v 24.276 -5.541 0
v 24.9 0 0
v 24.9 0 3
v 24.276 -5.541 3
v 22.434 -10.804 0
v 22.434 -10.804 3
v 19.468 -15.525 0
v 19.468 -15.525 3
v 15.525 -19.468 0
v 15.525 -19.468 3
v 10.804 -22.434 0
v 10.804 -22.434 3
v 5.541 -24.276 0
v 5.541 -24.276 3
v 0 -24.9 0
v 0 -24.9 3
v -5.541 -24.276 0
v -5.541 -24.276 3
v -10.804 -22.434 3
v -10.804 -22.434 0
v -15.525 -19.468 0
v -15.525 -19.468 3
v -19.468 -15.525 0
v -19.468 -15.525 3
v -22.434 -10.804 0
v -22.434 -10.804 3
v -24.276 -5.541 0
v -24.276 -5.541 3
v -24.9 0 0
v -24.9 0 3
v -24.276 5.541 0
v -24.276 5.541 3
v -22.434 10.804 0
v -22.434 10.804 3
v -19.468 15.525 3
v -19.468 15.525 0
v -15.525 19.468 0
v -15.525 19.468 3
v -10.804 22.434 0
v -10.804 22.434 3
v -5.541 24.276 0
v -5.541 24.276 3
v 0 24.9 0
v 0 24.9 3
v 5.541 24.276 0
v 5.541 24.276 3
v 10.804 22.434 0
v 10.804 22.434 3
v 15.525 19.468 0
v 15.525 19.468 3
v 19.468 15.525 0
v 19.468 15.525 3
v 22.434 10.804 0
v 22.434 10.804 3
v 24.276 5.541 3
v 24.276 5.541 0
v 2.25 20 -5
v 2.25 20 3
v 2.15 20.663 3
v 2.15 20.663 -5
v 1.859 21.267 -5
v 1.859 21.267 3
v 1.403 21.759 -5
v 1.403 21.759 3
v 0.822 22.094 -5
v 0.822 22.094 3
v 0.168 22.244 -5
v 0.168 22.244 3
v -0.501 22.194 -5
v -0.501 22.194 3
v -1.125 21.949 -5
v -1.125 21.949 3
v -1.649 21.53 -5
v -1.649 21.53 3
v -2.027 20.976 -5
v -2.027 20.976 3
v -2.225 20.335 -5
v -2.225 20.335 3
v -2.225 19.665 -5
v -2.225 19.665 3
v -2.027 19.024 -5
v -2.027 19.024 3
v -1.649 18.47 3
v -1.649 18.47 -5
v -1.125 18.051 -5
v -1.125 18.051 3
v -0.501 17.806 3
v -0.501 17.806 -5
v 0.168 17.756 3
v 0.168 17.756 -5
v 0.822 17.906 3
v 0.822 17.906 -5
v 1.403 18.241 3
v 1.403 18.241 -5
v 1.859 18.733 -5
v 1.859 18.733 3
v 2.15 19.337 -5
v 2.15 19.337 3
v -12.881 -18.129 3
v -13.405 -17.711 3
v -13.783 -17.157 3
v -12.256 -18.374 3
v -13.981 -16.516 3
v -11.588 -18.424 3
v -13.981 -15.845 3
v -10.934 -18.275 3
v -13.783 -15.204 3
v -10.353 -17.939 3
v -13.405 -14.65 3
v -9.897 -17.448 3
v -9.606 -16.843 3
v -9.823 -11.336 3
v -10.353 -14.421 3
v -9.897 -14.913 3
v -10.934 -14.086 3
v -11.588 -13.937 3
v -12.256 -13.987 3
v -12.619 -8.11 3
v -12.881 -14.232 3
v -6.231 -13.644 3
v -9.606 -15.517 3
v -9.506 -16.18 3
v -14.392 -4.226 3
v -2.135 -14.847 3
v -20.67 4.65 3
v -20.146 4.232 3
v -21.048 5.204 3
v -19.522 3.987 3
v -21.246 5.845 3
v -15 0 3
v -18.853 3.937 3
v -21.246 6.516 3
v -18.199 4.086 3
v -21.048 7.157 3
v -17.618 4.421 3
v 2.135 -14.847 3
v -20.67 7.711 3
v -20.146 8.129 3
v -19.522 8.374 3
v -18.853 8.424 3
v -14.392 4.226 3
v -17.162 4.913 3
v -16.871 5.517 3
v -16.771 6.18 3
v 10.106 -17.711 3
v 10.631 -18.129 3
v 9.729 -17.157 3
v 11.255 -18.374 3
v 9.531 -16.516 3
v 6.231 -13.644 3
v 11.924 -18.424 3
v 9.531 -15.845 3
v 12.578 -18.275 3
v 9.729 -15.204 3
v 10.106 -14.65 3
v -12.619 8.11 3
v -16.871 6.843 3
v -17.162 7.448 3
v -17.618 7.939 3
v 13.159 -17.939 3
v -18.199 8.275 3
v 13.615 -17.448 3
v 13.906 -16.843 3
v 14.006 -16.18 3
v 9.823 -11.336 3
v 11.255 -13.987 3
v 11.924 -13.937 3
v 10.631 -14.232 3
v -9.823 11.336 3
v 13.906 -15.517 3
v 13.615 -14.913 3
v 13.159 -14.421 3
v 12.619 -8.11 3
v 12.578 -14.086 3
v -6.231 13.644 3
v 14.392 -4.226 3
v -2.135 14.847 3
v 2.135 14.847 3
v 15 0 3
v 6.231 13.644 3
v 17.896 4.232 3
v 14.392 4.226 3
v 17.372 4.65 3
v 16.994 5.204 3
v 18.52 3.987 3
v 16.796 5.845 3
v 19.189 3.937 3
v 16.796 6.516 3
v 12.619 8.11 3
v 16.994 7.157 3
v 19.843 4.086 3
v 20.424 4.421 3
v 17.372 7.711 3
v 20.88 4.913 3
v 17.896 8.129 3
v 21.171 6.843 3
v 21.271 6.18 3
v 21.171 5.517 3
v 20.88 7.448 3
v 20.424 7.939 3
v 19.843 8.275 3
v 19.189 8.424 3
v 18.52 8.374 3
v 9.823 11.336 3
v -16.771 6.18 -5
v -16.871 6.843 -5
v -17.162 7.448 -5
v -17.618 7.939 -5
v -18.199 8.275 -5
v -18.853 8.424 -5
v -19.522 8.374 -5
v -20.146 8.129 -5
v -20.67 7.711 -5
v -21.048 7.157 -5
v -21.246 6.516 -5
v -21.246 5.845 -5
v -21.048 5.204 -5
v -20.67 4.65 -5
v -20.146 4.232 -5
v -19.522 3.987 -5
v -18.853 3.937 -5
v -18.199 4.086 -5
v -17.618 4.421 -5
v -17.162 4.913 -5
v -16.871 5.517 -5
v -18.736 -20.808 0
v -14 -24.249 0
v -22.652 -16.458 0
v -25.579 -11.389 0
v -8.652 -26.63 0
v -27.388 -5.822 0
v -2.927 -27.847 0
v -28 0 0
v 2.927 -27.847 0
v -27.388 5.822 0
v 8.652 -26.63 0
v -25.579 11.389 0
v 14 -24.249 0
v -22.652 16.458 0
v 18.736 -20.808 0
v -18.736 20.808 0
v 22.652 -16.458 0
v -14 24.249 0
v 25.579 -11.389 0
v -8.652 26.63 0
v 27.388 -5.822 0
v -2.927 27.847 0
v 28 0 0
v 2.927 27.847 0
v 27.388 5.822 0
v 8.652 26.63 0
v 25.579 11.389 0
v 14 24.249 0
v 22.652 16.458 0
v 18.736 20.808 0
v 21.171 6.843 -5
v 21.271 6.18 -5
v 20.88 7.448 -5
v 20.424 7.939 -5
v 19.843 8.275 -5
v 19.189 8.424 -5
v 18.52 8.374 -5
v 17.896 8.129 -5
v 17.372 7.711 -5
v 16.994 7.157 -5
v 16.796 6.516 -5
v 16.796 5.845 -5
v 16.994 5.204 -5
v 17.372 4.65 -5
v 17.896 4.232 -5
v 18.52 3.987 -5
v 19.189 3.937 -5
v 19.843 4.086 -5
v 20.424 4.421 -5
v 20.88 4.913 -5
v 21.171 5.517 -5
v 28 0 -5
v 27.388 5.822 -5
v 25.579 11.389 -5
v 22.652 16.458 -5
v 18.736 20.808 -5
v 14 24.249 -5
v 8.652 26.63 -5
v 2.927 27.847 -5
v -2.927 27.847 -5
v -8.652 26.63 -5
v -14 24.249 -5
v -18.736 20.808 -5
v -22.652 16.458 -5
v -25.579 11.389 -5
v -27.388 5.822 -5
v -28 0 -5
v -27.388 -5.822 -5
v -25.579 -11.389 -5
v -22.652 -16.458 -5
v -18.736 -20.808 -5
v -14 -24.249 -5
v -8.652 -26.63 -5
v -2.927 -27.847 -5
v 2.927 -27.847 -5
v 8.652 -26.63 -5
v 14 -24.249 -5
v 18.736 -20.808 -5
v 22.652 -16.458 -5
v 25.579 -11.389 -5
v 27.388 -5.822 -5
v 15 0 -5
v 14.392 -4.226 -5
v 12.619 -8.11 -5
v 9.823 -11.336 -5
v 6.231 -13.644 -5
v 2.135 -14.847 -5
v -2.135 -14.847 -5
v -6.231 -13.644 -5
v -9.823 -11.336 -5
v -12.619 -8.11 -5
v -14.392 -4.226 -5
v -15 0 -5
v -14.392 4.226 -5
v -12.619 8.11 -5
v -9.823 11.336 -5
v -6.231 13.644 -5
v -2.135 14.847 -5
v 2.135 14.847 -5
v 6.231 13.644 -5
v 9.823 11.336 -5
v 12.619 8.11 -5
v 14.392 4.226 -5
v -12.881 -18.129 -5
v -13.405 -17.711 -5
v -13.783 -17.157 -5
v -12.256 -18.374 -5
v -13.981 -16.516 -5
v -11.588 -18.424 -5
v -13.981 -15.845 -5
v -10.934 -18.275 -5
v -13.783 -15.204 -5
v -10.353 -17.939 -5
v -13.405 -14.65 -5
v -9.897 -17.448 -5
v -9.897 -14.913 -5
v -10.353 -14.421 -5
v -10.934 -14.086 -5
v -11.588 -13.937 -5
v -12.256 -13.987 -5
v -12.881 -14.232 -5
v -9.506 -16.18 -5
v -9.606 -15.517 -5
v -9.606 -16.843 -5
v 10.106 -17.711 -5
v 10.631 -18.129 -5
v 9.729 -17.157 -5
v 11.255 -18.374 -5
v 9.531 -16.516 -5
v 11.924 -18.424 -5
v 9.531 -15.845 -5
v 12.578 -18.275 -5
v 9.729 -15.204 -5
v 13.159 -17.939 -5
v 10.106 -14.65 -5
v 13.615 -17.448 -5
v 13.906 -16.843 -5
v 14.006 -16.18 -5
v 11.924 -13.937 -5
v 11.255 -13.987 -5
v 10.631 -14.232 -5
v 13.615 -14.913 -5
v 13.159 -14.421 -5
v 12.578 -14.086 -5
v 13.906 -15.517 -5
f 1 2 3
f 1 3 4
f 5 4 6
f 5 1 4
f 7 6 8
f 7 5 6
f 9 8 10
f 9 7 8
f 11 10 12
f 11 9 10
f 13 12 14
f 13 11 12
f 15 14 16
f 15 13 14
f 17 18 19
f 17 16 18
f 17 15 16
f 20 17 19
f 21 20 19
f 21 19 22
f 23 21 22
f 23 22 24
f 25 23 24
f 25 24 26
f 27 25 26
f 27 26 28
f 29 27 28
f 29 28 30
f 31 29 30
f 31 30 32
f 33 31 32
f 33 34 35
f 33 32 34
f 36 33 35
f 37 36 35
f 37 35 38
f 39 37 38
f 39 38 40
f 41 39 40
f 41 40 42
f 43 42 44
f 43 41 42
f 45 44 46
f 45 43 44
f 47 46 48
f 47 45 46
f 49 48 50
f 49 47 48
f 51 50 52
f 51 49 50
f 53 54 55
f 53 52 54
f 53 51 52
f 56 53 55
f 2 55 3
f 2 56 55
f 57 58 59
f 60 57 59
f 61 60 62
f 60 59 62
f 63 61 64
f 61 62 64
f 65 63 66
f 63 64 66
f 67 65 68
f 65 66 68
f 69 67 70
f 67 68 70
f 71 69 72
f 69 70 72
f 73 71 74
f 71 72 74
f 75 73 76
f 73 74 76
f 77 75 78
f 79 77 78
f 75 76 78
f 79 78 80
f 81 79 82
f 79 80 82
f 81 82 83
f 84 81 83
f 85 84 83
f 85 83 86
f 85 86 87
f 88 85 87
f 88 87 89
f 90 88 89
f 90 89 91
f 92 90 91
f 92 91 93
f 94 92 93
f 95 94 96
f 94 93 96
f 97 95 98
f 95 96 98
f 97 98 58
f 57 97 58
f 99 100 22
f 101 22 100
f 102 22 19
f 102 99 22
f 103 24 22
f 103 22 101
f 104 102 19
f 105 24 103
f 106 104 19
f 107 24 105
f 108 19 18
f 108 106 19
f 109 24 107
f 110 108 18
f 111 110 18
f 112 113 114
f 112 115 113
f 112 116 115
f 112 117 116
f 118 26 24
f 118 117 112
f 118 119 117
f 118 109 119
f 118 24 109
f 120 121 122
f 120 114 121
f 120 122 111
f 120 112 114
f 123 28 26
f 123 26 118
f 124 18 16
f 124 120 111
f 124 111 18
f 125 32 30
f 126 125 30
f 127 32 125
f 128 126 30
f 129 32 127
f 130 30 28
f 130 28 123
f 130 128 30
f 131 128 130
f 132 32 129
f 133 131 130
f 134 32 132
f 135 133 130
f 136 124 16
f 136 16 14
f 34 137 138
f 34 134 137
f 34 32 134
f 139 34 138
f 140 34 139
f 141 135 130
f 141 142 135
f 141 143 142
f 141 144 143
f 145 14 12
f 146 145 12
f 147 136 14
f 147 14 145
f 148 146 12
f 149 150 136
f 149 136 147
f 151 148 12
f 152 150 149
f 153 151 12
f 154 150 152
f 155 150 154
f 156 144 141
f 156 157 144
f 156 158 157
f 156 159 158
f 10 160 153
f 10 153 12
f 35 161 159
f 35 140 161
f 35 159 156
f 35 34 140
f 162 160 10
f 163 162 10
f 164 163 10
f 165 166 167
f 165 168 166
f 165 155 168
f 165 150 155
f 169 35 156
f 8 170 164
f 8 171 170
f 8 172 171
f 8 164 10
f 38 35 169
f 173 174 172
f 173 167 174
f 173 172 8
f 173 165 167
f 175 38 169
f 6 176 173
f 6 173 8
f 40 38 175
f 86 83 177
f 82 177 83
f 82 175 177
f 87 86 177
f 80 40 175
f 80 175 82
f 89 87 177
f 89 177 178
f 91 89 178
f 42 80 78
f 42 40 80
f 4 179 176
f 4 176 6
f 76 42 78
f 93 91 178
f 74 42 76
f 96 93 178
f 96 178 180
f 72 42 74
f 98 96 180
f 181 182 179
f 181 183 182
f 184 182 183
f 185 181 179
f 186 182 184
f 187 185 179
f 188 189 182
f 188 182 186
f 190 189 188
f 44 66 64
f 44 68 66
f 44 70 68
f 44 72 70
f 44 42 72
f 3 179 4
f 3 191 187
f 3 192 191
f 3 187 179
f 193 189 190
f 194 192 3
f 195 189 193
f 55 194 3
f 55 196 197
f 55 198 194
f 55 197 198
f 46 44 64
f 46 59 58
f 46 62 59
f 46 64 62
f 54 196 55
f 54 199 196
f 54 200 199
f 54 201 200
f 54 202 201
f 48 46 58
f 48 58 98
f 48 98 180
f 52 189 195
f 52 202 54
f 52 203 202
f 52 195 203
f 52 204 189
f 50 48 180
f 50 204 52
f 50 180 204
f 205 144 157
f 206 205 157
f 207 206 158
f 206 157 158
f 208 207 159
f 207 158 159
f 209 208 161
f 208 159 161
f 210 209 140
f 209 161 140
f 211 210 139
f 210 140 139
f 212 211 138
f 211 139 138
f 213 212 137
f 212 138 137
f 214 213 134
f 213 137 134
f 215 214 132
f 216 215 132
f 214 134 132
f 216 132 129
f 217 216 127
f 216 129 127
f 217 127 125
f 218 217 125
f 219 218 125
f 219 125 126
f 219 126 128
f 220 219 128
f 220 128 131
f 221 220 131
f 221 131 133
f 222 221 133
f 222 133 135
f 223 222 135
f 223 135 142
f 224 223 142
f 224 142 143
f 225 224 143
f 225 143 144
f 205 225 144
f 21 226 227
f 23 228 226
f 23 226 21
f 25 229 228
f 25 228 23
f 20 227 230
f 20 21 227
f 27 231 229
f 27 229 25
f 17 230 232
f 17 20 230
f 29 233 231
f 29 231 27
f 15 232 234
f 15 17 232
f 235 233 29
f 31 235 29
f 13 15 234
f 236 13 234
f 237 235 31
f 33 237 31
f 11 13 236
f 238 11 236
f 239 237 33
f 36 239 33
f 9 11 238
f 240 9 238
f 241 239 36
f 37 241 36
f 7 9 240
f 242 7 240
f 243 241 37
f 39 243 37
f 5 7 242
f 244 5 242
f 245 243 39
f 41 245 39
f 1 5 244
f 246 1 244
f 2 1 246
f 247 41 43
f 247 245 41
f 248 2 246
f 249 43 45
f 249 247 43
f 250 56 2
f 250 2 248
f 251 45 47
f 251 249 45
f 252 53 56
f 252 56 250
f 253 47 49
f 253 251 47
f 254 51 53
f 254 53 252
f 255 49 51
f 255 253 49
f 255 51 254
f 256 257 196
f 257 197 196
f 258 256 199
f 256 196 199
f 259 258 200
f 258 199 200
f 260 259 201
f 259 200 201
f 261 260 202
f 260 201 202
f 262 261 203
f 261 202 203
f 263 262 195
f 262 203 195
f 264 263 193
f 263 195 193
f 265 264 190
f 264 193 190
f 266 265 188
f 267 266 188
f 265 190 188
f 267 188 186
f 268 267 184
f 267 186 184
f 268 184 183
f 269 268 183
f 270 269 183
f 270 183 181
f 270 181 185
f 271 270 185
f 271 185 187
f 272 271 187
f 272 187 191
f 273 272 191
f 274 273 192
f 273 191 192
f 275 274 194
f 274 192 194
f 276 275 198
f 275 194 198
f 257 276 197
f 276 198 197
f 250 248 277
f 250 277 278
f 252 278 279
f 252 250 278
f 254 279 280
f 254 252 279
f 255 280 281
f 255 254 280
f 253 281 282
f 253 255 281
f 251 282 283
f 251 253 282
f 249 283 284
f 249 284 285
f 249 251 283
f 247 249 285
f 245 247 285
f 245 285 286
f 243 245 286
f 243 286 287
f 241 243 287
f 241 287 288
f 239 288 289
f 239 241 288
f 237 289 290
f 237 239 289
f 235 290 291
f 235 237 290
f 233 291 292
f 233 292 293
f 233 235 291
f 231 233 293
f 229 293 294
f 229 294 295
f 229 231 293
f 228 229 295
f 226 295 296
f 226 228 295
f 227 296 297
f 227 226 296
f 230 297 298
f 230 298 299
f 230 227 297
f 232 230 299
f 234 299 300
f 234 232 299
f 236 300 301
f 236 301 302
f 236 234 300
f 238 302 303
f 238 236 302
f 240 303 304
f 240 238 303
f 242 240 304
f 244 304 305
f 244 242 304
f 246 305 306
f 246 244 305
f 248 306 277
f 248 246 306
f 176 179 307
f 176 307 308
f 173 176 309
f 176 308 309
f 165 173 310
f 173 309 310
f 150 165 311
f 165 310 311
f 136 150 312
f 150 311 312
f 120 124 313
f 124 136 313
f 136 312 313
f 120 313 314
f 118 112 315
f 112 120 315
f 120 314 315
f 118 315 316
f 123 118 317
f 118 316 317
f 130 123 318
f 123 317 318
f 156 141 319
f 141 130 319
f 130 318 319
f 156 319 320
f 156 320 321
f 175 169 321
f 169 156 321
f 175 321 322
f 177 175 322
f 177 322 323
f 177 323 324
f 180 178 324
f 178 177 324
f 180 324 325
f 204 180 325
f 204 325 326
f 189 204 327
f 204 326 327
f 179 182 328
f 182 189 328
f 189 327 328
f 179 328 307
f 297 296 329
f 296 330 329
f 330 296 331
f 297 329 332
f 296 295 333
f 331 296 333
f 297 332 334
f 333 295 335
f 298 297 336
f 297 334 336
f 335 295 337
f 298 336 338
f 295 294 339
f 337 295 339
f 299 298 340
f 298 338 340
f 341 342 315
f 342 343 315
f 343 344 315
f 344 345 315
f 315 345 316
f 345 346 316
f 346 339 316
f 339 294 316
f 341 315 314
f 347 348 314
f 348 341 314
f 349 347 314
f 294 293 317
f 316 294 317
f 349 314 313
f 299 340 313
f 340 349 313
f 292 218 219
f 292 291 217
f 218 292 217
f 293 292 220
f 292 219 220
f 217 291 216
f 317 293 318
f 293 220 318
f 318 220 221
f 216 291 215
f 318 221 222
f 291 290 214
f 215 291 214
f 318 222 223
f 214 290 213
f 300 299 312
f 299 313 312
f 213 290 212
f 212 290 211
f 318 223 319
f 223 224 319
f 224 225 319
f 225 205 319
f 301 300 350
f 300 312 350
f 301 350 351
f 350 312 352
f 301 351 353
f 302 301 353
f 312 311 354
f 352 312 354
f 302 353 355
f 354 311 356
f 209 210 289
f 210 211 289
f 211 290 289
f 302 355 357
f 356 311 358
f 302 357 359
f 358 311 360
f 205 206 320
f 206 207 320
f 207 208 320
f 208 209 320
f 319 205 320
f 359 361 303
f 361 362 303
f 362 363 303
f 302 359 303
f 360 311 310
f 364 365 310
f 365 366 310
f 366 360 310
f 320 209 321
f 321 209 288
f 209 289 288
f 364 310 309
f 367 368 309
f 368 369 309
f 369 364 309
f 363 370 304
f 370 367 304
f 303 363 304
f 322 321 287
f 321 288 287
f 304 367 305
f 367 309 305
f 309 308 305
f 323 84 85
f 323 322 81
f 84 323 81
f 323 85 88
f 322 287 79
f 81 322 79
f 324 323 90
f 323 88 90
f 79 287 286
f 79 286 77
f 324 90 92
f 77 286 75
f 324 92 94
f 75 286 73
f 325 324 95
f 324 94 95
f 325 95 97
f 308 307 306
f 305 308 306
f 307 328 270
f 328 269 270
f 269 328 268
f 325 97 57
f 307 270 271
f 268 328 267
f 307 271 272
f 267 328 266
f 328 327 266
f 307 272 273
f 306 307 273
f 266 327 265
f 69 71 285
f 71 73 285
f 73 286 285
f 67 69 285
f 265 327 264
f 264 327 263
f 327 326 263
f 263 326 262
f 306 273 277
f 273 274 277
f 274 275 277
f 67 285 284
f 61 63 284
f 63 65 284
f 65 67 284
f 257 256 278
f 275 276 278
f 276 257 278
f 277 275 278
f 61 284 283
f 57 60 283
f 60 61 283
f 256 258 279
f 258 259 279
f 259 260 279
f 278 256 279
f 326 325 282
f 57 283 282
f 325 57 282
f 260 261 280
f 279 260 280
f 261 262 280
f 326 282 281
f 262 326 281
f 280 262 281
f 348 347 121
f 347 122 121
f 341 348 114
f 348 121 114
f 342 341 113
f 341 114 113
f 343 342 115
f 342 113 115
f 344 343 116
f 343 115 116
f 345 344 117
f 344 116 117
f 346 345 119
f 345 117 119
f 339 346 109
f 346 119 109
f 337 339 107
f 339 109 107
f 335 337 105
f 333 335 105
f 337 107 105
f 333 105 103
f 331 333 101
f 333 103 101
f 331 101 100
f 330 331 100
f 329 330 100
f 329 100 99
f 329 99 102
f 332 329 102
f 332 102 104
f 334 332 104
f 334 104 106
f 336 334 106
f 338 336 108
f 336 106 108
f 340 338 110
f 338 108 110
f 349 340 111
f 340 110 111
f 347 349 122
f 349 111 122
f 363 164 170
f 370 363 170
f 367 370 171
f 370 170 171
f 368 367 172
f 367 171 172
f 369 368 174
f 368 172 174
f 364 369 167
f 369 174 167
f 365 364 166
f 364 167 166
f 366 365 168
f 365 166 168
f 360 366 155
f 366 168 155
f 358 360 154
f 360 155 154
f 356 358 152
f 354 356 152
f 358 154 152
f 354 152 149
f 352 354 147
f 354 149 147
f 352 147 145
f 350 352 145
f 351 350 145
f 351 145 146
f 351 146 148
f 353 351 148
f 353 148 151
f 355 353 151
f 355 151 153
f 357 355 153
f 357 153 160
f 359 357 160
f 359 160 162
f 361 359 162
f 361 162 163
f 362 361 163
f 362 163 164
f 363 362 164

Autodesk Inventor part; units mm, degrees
ref_plane "YZ Plane" through (0, 0, 0) normal (1, 0, 0) x (0, 1, 0)
ref_plane "XZ Plane" through (0, 0, 0) normal (0, 1, 0) x (-1, 0, 0)
ref_plane "XY Plane" through (0, 0, 0) normal (0, 0, 1) x (1, 0, 0)
sketch "스케치1" plane through (0, 0, 0) normal (0, 0, 1) x (1, 0, 0)
  circle A0 centre (0, 0) radius 24.9
  circle A1 centre (0, 0) radius 28
  circle A2 centre (0, 0) radius 15
  dimension "d0" = 49.8
  dimension "d1" = 56
  dimension "d2" = 30
extrude "돌출1" add sketch "스케치1" along normal blind 3 contours A0
extrude "돌출2" add sketch "스케치1" against normal blind 5 contours A0 | A1
sketch "스케치3" plane through (0, 0, 3) normal (0, 0, 1) x (1, 0, 0)
  circle A0 centre (0, 0) radius 20 construction
  circle A1 centre (0, 20) radius 2.25
  circle A2 centre (-19.0211, 6.1803) radius 2.25
  circle A3 centre (-11.7557, -16.1803) radius 2.25
  circle A4 centre (11.7557, -16.1803) radius 2.25
  circle A5 centre (19.0211, 6.1803) radius 2.25
  dimension "d9" = 40
  dimension "d10" = 4.5
  dimension "d13" = 360
extrude "돌출3" cut sketch "스케치3" against normal blind 44.5
properties part number "사이클로이드 기어 축 연결 하우징"
